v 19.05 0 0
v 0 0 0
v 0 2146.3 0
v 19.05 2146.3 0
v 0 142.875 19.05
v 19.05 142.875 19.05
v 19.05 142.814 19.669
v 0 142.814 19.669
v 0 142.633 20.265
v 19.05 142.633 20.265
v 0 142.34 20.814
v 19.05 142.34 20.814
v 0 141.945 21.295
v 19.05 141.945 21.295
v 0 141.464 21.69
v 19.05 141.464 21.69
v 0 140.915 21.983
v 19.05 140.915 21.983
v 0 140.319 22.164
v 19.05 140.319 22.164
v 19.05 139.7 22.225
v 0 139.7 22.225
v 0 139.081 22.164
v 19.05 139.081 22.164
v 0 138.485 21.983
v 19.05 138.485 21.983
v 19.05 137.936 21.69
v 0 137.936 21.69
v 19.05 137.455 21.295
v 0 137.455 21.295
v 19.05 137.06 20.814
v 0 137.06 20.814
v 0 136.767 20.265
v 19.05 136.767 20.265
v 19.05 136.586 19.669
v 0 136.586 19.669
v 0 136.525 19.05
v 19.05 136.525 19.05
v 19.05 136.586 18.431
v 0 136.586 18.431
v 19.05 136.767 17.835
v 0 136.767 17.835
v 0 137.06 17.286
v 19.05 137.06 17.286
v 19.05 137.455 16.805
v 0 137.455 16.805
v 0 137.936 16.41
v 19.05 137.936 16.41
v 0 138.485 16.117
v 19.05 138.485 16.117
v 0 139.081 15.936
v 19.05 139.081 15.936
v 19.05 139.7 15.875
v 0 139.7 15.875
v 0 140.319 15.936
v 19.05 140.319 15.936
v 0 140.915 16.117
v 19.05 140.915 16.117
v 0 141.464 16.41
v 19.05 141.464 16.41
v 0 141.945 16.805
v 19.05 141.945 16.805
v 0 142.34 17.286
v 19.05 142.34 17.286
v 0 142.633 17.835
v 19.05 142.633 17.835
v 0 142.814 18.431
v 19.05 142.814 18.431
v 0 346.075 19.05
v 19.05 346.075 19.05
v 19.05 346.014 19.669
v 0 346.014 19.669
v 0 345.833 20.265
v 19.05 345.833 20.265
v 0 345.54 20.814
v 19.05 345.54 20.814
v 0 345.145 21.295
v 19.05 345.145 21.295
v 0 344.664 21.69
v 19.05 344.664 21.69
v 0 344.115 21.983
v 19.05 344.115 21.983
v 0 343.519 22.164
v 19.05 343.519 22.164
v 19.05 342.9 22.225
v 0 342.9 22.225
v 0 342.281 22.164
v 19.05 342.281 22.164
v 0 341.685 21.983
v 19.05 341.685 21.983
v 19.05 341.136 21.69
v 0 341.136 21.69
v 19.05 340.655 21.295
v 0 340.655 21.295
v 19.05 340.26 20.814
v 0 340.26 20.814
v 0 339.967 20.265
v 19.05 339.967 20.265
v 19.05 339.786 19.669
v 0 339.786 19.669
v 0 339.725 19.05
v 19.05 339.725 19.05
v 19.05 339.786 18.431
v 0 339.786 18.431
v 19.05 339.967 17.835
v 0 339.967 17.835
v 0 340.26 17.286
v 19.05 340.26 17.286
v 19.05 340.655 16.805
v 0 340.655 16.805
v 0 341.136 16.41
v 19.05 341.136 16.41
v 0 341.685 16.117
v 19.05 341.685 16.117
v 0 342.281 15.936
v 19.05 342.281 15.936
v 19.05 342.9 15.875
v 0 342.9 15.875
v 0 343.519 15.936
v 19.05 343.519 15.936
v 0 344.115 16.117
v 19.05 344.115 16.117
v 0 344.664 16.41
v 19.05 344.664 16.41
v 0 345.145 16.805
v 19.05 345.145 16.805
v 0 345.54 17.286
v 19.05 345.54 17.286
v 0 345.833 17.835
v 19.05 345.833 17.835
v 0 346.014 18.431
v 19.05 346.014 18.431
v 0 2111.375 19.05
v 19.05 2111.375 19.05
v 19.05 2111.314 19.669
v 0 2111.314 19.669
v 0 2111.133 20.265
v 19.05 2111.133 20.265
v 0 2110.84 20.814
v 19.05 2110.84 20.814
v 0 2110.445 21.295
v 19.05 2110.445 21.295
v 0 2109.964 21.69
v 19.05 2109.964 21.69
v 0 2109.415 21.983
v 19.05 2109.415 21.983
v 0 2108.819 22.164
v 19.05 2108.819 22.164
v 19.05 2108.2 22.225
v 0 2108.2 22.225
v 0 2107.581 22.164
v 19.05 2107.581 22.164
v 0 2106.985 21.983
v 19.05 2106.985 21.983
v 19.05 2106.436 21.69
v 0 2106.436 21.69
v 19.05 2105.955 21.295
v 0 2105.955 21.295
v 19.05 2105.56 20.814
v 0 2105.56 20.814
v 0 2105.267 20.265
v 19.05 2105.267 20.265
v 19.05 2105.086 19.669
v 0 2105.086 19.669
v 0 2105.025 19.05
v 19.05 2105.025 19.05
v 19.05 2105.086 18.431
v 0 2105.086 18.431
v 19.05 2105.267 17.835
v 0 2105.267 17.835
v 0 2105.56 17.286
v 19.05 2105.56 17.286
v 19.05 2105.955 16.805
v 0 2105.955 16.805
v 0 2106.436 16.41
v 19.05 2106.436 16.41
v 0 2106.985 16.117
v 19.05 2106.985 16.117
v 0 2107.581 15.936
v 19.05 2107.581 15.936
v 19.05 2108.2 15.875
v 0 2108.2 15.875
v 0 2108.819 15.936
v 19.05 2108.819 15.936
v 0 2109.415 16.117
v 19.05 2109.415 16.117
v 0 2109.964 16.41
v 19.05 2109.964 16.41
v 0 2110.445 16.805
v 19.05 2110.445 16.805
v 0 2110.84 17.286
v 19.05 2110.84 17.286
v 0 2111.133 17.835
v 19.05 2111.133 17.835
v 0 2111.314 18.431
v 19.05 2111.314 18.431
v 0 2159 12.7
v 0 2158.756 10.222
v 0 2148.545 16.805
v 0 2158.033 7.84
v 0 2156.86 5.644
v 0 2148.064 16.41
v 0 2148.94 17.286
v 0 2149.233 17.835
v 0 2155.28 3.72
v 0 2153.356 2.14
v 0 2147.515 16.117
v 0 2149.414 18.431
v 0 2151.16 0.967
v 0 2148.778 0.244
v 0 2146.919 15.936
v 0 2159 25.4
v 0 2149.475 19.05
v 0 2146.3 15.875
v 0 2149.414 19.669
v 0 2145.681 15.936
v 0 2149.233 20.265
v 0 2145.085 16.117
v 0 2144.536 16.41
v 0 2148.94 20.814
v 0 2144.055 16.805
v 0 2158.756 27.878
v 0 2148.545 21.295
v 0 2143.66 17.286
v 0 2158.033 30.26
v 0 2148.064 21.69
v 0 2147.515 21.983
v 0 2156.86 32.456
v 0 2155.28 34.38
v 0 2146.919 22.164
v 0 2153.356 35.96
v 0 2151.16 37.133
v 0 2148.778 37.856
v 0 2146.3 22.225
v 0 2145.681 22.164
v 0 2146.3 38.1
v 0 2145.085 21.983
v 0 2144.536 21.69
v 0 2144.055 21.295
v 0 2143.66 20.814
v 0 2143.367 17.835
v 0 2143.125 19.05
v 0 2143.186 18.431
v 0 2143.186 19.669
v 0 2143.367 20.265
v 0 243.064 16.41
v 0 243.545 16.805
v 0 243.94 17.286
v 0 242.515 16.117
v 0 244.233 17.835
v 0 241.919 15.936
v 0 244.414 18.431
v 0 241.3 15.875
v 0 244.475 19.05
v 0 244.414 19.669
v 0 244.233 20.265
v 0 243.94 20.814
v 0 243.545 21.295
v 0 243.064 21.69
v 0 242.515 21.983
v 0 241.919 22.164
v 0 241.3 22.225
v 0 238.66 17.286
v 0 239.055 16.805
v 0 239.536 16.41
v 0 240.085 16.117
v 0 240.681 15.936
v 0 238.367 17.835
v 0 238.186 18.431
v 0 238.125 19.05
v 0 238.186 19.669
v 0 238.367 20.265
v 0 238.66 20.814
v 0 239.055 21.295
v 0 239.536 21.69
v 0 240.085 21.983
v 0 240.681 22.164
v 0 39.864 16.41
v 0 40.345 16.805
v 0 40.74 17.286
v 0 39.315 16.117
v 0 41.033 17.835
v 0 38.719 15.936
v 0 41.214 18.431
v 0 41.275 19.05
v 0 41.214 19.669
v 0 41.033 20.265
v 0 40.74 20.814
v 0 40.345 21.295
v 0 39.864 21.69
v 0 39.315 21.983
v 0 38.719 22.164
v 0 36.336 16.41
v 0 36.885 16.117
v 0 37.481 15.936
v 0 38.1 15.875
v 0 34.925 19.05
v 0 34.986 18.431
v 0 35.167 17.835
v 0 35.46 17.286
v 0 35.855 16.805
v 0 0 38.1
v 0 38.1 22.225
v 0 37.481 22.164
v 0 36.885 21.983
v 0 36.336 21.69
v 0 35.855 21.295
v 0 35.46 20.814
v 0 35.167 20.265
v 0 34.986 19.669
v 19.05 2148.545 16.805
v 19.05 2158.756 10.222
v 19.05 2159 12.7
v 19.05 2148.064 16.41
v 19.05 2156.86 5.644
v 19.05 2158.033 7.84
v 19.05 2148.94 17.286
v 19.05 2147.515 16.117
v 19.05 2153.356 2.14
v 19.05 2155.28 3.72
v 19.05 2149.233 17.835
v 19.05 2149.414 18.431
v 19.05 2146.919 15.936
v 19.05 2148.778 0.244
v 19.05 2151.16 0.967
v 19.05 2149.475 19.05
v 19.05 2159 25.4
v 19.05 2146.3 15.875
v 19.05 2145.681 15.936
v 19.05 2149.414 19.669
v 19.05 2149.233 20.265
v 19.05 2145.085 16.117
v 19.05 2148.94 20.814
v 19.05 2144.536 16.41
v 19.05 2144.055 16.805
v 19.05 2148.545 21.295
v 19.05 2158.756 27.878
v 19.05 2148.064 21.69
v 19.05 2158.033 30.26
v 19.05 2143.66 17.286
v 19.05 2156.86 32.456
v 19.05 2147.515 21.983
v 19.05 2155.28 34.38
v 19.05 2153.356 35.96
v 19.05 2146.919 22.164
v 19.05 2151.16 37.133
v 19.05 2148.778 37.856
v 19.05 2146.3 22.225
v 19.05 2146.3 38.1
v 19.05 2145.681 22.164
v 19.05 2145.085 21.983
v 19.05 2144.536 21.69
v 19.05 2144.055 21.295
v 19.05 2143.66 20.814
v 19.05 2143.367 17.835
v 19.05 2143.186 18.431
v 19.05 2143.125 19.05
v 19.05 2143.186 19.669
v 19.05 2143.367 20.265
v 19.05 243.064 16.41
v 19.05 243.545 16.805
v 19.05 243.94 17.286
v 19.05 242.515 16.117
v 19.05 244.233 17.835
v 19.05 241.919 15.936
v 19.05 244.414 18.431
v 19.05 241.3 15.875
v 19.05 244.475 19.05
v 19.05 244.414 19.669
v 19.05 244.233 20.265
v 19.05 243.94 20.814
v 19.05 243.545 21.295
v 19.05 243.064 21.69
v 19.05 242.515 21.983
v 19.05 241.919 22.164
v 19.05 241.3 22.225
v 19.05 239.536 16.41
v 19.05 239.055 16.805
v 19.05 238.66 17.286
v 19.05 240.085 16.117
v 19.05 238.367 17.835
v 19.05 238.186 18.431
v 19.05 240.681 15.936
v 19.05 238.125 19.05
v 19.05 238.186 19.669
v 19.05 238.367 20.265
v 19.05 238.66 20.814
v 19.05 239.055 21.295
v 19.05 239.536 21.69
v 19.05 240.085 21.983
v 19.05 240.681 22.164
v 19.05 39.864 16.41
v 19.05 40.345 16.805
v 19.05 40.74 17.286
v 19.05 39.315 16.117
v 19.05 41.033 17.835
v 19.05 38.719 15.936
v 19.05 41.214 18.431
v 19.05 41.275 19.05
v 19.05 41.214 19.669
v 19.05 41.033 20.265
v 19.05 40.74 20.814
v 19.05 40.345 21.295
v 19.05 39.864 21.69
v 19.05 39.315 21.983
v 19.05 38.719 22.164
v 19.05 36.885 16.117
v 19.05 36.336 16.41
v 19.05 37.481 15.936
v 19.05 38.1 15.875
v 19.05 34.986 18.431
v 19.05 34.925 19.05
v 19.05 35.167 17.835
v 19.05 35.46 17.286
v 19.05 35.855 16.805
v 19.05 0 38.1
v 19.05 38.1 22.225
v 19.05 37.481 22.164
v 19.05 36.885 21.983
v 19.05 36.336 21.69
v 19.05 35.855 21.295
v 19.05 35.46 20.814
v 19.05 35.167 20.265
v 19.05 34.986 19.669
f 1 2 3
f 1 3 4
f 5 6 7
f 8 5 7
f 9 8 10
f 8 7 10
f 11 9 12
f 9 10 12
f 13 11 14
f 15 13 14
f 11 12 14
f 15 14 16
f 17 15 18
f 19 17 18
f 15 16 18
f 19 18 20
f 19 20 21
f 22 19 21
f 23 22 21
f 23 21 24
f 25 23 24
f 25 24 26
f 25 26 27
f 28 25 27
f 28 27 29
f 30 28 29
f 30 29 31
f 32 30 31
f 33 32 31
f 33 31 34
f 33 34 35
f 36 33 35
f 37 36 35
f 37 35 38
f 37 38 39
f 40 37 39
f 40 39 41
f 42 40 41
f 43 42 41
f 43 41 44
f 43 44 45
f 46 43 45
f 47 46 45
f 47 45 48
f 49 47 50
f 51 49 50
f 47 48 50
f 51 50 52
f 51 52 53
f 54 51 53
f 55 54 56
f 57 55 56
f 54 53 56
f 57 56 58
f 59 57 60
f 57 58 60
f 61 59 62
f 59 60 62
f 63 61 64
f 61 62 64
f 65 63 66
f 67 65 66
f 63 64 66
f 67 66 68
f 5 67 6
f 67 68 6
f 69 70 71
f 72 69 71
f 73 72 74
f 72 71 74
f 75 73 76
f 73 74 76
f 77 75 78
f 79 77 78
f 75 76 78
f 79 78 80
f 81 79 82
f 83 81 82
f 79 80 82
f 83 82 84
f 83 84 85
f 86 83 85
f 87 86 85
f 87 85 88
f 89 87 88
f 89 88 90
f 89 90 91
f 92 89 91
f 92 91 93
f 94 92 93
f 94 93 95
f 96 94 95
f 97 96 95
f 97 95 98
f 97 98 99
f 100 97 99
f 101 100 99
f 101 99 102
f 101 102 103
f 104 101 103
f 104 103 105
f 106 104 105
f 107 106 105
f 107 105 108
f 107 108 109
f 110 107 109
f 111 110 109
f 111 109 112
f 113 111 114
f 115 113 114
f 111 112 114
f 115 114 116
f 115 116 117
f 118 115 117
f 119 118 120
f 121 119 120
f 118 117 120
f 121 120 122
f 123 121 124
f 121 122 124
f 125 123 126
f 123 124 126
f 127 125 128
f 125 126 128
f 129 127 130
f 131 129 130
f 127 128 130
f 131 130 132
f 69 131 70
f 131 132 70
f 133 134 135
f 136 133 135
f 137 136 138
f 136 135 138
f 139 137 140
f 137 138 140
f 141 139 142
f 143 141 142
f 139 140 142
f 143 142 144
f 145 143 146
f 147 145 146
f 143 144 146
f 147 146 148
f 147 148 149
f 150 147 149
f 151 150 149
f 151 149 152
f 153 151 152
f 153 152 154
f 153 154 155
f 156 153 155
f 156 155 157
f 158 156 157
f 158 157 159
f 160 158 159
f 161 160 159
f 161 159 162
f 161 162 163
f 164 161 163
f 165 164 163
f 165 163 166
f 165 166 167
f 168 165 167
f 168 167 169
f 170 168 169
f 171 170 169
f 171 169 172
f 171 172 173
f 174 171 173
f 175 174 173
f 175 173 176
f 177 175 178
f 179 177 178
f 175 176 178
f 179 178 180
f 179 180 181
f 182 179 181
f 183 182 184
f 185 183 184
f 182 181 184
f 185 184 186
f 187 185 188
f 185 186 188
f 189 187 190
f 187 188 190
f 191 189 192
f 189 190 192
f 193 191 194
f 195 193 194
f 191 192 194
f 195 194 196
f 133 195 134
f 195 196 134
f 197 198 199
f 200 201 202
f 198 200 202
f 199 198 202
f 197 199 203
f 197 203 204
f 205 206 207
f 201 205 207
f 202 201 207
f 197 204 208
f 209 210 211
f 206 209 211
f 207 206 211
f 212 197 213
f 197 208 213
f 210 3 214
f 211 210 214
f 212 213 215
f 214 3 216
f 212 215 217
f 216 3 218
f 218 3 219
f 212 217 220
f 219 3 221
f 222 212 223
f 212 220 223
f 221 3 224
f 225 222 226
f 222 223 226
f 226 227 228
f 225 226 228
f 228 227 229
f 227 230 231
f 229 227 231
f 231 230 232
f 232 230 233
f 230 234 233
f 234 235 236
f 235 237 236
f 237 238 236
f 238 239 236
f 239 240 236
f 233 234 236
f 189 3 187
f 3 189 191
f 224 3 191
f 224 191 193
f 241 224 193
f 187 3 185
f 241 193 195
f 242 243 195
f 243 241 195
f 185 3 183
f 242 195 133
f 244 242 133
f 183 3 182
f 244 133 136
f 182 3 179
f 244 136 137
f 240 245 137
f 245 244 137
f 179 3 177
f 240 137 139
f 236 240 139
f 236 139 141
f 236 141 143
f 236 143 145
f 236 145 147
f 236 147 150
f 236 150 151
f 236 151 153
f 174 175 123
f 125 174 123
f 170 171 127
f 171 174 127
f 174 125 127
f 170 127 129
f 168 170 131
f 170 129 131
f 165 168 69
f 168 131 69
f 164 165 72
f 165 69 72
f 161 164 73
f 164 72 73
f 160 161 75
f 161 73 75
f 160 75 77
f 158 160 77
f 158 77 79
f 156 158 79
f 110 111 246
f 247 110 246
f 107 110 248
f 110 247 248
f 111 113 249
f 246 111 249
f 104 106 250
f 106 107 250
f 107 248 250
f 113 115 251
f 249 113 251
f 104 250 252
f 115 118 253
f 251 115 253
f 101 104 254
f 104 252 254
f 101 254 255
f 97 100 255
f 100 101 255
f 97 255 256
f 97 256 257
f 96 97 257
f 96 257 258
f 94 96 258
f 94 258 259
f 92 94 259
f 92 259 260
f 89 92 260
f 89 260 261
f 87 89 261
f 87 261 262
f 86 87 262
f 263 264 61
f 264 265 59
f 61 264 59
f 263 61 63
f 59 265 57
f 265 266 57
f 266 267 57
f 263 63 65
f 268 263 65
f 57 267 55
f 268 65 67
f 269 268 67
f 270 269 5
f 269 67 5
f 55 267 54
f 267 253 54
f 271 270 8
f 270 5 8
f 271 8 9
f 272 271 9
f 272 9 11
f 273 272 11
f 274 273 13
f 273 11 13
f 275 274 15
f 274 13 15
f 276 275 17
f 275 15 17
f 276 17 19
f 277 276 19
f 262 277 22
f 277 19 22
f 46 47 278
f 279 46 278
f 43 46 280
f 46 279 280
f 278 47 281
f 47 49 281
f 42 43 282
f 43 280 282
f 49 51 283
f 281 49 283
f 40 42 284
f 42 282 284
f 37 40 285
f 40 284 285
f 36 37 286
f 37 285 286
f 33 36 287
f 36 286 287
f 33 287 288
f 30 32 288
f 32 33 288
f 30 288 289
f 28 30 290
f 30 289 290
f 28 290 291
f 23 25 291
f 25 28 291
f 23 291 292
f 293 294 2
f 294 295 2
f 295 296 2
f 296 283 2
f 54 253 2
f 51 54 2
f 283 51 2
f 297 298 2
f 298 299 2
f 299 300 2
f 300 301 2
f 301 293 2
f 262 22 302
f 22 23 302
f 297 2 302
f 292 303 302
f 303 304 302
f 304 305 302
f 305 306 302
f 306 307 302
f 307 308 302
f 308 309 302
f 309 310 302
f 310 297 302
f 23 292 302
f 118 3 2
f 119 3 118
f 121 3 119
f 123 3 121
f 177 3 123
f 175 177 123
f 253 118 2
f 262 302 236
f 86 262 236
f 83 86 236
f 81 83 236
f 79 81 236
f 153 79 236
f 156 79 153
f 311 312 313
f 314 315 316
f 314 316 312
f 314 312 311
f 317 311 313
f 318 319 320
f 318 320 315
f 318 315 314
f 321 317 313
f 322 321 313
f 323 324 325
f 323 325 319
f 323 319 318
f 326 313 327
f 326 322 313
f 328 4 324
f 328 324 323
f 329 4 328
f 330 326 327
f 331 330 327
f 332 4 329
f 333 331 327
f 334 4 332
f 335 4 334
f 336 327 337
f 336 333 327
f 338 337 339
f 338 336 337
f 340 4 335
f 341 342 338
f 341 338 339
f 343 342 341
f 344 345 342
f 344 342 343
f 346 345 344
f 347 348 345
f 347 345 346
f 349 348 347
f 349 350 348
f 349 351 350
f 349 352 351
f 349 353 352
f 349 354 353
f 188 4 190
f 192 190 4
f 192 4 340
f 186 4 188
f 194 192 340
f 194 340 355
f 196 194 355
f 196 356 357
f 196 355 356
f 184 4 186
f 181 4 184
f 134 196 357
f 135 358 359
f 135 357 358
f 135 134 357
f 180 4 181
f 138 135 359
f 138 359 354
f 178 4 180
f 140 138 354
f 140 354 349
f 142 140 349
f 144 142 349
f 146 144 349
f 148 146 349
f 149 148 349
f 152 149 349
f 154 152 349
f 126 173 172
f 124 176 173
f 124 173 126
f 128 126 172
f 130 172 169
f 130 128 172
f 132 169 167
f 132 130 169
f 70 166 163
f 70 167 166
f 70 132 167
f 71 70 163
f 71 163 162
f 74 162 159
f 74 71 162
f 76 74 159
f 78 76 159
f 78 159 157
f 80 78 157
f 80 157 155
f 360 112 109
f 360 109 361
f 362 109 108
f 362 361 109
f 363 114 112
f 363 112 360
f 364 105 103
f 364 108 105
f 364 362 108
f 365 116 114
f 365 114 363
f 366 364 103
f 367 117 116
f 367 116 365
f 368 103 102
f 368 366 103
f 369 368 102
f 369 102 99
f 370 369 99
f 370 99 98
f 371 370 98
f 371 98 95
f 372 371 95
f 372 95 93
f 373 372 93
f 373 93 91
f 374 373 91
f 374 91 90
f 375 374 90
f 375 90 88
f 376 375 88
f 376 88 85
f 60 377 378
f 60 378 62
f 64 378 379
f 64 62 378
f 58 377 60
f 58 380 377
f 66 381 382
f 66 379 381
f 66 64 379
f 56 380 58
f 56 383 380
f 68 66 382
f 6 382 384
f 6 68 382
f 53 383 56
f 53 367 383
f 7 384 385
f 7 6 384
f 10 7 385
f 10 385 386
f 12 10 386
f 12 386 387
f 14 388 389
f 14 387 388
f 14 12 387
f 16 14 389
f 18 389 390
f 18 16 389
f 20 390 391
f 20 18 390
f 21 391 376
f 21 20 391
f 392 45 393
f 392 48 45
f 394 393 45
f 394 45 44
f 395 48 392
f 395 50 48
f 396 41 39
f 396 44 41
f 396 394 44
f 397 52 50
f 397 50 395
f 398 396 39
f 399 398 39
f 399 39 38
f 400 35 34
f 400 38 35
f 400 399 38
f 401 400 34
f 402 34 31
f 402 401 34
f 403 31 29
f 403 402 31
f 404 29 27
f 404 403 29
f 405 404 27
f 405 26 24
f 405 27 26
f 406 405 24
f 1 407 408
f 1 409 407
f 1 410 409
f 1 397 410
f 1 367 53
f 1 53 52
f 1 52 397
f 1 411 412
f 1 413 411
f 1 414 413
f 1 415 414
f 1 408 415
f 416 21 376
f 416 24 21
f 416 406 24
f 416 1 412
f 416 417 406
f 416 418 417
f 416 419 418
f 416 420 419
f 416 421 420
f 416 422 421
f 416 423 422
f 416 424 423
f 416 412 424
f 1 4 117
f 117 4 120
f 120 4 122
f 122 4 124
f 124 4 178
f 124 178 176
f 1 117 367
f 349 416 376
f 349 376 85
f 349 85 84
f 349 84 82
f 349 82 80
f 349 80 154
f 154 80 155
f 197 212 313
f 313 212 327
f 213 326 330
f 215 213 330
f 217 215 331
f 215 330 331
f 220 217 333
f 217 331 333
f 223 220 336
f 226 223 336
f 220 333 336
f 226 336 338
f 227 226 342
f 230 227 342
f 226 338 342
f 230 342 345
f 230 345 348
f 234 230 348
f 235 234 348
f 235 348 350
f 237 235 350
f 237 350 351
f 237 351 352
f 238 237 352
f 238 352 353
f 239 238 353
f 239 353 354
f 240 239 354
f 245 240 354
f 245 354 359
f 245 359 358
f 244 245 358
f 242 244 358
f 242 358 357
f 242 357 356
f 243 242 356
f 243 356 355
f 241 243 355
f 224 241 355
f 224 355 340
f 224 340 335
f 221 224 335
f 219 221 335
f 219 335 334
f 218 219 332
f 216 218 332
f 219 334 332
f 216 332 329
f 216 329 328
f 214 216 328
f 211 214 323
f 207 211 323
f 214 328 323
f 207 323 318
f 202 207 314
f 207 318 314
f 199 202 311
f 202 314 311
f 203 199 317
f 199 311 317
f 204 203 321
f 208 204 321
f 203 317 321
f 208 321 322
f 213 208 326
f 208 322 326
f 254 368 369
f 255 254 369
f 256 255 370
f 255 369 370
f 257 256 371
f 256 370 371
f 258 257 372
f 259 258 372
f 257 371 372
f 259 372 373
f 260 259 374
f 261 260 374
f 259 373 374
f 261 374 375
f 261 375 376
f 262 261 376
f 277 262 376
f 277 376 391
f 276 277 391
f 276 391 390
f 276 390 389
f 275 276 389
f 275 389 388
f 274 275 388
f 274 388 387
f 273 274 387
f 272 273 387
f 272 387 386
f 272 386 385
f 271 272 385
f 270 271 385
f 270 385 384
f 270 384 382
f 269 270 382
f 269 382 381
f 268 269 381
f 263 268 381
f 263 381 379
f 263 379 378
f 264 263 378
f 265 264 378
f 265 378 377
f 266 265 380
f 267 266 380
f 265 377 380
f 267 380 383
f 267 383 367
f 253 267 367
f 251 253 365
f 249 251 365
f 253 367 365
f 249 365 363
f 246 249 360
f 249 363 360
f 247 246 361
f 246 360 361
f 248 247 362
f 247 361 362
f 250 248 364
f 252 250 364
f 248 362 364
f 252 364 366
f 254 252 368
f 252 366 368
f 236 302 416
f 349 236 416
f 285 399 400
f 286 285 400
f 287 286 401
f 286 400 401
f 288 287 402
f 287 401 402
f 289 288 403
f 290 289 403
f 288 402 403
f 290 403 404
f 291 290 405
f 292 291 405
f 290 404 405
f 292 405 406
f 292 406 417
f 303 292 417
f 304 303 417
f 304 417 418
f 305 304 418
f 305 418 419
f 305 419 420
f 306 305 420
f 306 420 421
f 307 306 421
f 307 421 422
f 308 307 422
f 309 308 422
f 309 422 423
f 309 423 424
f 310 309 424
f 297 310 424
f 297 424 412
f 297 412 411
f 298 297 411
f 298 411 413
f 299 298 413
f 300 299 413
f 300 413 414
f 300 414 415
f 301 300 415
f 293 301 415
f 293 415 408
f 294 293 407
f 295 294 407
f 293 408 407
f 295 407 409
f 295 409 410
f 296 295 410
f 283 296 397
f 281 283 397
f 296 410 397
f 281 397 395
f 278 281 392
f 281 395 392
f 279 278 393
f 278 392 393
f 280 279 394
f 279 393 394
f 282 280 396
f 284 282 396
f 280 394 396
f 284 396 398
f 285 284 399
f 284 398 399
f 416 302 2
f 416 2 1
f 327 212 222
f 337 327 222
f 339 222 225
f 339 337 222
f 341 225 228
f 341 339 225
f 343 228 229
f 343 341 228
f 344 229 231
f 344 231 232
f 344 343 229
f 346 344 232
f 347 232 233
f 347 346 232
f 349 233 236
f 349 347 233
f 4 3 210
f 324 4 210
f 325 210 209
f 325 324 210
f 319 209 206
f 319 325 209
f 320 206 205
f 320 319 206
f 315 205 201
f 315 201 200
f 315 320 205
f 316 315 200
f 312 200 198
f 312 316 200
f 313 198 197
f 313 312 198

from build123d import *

# Parameters (mm, degrees)
F0_W     = 19.05
F0_H     = 38.1
F1_DEPTH = 2159
F2_R     = 3.175
F3_DEPTH = 19.051
F4_R     = 12.7


with BuildPart() as f1:
    # F0 (on Front) → F1 (new body)
    with BuildSketch(Plane.XZ):
        with Locations((9.525, 19.05)):
            Rectangle(F0_W, F0_H)
    extrude(amount=-F1_DEPTH)

    # F2 (on face) → F3 (cut, through all)
    with BuildSketch(Plane.YZ.offset(19.05)):
        with Locations((38.1, 19.05)):
            Circle(F2_R)
        with Locations((2146.3, 19.05)):
            Circle(F2_R)
        with Locations((2108.2, 19.05)):
            Circle(F2_R)
        with Locations((139.7, 19.05)):
            Circle(F2_R)
        with Locations((241.3, 19.05)):
            Circle(F2_R)
        with Locations((342.9, 19.05)):
            Circle(F2_R)
    extrude(amount=-F3_DEPTH, mode=Mode.SUBTRACT)

    # F4
    f4_edges = [f1.edges().sort_by_distance(p)[0] for p in [
        (9.525, 2159, 38.1),
        (9.525, 2159, 0),
    ]]
    fillet(f4_edges, radius=F4_R)


solid = f1.part
